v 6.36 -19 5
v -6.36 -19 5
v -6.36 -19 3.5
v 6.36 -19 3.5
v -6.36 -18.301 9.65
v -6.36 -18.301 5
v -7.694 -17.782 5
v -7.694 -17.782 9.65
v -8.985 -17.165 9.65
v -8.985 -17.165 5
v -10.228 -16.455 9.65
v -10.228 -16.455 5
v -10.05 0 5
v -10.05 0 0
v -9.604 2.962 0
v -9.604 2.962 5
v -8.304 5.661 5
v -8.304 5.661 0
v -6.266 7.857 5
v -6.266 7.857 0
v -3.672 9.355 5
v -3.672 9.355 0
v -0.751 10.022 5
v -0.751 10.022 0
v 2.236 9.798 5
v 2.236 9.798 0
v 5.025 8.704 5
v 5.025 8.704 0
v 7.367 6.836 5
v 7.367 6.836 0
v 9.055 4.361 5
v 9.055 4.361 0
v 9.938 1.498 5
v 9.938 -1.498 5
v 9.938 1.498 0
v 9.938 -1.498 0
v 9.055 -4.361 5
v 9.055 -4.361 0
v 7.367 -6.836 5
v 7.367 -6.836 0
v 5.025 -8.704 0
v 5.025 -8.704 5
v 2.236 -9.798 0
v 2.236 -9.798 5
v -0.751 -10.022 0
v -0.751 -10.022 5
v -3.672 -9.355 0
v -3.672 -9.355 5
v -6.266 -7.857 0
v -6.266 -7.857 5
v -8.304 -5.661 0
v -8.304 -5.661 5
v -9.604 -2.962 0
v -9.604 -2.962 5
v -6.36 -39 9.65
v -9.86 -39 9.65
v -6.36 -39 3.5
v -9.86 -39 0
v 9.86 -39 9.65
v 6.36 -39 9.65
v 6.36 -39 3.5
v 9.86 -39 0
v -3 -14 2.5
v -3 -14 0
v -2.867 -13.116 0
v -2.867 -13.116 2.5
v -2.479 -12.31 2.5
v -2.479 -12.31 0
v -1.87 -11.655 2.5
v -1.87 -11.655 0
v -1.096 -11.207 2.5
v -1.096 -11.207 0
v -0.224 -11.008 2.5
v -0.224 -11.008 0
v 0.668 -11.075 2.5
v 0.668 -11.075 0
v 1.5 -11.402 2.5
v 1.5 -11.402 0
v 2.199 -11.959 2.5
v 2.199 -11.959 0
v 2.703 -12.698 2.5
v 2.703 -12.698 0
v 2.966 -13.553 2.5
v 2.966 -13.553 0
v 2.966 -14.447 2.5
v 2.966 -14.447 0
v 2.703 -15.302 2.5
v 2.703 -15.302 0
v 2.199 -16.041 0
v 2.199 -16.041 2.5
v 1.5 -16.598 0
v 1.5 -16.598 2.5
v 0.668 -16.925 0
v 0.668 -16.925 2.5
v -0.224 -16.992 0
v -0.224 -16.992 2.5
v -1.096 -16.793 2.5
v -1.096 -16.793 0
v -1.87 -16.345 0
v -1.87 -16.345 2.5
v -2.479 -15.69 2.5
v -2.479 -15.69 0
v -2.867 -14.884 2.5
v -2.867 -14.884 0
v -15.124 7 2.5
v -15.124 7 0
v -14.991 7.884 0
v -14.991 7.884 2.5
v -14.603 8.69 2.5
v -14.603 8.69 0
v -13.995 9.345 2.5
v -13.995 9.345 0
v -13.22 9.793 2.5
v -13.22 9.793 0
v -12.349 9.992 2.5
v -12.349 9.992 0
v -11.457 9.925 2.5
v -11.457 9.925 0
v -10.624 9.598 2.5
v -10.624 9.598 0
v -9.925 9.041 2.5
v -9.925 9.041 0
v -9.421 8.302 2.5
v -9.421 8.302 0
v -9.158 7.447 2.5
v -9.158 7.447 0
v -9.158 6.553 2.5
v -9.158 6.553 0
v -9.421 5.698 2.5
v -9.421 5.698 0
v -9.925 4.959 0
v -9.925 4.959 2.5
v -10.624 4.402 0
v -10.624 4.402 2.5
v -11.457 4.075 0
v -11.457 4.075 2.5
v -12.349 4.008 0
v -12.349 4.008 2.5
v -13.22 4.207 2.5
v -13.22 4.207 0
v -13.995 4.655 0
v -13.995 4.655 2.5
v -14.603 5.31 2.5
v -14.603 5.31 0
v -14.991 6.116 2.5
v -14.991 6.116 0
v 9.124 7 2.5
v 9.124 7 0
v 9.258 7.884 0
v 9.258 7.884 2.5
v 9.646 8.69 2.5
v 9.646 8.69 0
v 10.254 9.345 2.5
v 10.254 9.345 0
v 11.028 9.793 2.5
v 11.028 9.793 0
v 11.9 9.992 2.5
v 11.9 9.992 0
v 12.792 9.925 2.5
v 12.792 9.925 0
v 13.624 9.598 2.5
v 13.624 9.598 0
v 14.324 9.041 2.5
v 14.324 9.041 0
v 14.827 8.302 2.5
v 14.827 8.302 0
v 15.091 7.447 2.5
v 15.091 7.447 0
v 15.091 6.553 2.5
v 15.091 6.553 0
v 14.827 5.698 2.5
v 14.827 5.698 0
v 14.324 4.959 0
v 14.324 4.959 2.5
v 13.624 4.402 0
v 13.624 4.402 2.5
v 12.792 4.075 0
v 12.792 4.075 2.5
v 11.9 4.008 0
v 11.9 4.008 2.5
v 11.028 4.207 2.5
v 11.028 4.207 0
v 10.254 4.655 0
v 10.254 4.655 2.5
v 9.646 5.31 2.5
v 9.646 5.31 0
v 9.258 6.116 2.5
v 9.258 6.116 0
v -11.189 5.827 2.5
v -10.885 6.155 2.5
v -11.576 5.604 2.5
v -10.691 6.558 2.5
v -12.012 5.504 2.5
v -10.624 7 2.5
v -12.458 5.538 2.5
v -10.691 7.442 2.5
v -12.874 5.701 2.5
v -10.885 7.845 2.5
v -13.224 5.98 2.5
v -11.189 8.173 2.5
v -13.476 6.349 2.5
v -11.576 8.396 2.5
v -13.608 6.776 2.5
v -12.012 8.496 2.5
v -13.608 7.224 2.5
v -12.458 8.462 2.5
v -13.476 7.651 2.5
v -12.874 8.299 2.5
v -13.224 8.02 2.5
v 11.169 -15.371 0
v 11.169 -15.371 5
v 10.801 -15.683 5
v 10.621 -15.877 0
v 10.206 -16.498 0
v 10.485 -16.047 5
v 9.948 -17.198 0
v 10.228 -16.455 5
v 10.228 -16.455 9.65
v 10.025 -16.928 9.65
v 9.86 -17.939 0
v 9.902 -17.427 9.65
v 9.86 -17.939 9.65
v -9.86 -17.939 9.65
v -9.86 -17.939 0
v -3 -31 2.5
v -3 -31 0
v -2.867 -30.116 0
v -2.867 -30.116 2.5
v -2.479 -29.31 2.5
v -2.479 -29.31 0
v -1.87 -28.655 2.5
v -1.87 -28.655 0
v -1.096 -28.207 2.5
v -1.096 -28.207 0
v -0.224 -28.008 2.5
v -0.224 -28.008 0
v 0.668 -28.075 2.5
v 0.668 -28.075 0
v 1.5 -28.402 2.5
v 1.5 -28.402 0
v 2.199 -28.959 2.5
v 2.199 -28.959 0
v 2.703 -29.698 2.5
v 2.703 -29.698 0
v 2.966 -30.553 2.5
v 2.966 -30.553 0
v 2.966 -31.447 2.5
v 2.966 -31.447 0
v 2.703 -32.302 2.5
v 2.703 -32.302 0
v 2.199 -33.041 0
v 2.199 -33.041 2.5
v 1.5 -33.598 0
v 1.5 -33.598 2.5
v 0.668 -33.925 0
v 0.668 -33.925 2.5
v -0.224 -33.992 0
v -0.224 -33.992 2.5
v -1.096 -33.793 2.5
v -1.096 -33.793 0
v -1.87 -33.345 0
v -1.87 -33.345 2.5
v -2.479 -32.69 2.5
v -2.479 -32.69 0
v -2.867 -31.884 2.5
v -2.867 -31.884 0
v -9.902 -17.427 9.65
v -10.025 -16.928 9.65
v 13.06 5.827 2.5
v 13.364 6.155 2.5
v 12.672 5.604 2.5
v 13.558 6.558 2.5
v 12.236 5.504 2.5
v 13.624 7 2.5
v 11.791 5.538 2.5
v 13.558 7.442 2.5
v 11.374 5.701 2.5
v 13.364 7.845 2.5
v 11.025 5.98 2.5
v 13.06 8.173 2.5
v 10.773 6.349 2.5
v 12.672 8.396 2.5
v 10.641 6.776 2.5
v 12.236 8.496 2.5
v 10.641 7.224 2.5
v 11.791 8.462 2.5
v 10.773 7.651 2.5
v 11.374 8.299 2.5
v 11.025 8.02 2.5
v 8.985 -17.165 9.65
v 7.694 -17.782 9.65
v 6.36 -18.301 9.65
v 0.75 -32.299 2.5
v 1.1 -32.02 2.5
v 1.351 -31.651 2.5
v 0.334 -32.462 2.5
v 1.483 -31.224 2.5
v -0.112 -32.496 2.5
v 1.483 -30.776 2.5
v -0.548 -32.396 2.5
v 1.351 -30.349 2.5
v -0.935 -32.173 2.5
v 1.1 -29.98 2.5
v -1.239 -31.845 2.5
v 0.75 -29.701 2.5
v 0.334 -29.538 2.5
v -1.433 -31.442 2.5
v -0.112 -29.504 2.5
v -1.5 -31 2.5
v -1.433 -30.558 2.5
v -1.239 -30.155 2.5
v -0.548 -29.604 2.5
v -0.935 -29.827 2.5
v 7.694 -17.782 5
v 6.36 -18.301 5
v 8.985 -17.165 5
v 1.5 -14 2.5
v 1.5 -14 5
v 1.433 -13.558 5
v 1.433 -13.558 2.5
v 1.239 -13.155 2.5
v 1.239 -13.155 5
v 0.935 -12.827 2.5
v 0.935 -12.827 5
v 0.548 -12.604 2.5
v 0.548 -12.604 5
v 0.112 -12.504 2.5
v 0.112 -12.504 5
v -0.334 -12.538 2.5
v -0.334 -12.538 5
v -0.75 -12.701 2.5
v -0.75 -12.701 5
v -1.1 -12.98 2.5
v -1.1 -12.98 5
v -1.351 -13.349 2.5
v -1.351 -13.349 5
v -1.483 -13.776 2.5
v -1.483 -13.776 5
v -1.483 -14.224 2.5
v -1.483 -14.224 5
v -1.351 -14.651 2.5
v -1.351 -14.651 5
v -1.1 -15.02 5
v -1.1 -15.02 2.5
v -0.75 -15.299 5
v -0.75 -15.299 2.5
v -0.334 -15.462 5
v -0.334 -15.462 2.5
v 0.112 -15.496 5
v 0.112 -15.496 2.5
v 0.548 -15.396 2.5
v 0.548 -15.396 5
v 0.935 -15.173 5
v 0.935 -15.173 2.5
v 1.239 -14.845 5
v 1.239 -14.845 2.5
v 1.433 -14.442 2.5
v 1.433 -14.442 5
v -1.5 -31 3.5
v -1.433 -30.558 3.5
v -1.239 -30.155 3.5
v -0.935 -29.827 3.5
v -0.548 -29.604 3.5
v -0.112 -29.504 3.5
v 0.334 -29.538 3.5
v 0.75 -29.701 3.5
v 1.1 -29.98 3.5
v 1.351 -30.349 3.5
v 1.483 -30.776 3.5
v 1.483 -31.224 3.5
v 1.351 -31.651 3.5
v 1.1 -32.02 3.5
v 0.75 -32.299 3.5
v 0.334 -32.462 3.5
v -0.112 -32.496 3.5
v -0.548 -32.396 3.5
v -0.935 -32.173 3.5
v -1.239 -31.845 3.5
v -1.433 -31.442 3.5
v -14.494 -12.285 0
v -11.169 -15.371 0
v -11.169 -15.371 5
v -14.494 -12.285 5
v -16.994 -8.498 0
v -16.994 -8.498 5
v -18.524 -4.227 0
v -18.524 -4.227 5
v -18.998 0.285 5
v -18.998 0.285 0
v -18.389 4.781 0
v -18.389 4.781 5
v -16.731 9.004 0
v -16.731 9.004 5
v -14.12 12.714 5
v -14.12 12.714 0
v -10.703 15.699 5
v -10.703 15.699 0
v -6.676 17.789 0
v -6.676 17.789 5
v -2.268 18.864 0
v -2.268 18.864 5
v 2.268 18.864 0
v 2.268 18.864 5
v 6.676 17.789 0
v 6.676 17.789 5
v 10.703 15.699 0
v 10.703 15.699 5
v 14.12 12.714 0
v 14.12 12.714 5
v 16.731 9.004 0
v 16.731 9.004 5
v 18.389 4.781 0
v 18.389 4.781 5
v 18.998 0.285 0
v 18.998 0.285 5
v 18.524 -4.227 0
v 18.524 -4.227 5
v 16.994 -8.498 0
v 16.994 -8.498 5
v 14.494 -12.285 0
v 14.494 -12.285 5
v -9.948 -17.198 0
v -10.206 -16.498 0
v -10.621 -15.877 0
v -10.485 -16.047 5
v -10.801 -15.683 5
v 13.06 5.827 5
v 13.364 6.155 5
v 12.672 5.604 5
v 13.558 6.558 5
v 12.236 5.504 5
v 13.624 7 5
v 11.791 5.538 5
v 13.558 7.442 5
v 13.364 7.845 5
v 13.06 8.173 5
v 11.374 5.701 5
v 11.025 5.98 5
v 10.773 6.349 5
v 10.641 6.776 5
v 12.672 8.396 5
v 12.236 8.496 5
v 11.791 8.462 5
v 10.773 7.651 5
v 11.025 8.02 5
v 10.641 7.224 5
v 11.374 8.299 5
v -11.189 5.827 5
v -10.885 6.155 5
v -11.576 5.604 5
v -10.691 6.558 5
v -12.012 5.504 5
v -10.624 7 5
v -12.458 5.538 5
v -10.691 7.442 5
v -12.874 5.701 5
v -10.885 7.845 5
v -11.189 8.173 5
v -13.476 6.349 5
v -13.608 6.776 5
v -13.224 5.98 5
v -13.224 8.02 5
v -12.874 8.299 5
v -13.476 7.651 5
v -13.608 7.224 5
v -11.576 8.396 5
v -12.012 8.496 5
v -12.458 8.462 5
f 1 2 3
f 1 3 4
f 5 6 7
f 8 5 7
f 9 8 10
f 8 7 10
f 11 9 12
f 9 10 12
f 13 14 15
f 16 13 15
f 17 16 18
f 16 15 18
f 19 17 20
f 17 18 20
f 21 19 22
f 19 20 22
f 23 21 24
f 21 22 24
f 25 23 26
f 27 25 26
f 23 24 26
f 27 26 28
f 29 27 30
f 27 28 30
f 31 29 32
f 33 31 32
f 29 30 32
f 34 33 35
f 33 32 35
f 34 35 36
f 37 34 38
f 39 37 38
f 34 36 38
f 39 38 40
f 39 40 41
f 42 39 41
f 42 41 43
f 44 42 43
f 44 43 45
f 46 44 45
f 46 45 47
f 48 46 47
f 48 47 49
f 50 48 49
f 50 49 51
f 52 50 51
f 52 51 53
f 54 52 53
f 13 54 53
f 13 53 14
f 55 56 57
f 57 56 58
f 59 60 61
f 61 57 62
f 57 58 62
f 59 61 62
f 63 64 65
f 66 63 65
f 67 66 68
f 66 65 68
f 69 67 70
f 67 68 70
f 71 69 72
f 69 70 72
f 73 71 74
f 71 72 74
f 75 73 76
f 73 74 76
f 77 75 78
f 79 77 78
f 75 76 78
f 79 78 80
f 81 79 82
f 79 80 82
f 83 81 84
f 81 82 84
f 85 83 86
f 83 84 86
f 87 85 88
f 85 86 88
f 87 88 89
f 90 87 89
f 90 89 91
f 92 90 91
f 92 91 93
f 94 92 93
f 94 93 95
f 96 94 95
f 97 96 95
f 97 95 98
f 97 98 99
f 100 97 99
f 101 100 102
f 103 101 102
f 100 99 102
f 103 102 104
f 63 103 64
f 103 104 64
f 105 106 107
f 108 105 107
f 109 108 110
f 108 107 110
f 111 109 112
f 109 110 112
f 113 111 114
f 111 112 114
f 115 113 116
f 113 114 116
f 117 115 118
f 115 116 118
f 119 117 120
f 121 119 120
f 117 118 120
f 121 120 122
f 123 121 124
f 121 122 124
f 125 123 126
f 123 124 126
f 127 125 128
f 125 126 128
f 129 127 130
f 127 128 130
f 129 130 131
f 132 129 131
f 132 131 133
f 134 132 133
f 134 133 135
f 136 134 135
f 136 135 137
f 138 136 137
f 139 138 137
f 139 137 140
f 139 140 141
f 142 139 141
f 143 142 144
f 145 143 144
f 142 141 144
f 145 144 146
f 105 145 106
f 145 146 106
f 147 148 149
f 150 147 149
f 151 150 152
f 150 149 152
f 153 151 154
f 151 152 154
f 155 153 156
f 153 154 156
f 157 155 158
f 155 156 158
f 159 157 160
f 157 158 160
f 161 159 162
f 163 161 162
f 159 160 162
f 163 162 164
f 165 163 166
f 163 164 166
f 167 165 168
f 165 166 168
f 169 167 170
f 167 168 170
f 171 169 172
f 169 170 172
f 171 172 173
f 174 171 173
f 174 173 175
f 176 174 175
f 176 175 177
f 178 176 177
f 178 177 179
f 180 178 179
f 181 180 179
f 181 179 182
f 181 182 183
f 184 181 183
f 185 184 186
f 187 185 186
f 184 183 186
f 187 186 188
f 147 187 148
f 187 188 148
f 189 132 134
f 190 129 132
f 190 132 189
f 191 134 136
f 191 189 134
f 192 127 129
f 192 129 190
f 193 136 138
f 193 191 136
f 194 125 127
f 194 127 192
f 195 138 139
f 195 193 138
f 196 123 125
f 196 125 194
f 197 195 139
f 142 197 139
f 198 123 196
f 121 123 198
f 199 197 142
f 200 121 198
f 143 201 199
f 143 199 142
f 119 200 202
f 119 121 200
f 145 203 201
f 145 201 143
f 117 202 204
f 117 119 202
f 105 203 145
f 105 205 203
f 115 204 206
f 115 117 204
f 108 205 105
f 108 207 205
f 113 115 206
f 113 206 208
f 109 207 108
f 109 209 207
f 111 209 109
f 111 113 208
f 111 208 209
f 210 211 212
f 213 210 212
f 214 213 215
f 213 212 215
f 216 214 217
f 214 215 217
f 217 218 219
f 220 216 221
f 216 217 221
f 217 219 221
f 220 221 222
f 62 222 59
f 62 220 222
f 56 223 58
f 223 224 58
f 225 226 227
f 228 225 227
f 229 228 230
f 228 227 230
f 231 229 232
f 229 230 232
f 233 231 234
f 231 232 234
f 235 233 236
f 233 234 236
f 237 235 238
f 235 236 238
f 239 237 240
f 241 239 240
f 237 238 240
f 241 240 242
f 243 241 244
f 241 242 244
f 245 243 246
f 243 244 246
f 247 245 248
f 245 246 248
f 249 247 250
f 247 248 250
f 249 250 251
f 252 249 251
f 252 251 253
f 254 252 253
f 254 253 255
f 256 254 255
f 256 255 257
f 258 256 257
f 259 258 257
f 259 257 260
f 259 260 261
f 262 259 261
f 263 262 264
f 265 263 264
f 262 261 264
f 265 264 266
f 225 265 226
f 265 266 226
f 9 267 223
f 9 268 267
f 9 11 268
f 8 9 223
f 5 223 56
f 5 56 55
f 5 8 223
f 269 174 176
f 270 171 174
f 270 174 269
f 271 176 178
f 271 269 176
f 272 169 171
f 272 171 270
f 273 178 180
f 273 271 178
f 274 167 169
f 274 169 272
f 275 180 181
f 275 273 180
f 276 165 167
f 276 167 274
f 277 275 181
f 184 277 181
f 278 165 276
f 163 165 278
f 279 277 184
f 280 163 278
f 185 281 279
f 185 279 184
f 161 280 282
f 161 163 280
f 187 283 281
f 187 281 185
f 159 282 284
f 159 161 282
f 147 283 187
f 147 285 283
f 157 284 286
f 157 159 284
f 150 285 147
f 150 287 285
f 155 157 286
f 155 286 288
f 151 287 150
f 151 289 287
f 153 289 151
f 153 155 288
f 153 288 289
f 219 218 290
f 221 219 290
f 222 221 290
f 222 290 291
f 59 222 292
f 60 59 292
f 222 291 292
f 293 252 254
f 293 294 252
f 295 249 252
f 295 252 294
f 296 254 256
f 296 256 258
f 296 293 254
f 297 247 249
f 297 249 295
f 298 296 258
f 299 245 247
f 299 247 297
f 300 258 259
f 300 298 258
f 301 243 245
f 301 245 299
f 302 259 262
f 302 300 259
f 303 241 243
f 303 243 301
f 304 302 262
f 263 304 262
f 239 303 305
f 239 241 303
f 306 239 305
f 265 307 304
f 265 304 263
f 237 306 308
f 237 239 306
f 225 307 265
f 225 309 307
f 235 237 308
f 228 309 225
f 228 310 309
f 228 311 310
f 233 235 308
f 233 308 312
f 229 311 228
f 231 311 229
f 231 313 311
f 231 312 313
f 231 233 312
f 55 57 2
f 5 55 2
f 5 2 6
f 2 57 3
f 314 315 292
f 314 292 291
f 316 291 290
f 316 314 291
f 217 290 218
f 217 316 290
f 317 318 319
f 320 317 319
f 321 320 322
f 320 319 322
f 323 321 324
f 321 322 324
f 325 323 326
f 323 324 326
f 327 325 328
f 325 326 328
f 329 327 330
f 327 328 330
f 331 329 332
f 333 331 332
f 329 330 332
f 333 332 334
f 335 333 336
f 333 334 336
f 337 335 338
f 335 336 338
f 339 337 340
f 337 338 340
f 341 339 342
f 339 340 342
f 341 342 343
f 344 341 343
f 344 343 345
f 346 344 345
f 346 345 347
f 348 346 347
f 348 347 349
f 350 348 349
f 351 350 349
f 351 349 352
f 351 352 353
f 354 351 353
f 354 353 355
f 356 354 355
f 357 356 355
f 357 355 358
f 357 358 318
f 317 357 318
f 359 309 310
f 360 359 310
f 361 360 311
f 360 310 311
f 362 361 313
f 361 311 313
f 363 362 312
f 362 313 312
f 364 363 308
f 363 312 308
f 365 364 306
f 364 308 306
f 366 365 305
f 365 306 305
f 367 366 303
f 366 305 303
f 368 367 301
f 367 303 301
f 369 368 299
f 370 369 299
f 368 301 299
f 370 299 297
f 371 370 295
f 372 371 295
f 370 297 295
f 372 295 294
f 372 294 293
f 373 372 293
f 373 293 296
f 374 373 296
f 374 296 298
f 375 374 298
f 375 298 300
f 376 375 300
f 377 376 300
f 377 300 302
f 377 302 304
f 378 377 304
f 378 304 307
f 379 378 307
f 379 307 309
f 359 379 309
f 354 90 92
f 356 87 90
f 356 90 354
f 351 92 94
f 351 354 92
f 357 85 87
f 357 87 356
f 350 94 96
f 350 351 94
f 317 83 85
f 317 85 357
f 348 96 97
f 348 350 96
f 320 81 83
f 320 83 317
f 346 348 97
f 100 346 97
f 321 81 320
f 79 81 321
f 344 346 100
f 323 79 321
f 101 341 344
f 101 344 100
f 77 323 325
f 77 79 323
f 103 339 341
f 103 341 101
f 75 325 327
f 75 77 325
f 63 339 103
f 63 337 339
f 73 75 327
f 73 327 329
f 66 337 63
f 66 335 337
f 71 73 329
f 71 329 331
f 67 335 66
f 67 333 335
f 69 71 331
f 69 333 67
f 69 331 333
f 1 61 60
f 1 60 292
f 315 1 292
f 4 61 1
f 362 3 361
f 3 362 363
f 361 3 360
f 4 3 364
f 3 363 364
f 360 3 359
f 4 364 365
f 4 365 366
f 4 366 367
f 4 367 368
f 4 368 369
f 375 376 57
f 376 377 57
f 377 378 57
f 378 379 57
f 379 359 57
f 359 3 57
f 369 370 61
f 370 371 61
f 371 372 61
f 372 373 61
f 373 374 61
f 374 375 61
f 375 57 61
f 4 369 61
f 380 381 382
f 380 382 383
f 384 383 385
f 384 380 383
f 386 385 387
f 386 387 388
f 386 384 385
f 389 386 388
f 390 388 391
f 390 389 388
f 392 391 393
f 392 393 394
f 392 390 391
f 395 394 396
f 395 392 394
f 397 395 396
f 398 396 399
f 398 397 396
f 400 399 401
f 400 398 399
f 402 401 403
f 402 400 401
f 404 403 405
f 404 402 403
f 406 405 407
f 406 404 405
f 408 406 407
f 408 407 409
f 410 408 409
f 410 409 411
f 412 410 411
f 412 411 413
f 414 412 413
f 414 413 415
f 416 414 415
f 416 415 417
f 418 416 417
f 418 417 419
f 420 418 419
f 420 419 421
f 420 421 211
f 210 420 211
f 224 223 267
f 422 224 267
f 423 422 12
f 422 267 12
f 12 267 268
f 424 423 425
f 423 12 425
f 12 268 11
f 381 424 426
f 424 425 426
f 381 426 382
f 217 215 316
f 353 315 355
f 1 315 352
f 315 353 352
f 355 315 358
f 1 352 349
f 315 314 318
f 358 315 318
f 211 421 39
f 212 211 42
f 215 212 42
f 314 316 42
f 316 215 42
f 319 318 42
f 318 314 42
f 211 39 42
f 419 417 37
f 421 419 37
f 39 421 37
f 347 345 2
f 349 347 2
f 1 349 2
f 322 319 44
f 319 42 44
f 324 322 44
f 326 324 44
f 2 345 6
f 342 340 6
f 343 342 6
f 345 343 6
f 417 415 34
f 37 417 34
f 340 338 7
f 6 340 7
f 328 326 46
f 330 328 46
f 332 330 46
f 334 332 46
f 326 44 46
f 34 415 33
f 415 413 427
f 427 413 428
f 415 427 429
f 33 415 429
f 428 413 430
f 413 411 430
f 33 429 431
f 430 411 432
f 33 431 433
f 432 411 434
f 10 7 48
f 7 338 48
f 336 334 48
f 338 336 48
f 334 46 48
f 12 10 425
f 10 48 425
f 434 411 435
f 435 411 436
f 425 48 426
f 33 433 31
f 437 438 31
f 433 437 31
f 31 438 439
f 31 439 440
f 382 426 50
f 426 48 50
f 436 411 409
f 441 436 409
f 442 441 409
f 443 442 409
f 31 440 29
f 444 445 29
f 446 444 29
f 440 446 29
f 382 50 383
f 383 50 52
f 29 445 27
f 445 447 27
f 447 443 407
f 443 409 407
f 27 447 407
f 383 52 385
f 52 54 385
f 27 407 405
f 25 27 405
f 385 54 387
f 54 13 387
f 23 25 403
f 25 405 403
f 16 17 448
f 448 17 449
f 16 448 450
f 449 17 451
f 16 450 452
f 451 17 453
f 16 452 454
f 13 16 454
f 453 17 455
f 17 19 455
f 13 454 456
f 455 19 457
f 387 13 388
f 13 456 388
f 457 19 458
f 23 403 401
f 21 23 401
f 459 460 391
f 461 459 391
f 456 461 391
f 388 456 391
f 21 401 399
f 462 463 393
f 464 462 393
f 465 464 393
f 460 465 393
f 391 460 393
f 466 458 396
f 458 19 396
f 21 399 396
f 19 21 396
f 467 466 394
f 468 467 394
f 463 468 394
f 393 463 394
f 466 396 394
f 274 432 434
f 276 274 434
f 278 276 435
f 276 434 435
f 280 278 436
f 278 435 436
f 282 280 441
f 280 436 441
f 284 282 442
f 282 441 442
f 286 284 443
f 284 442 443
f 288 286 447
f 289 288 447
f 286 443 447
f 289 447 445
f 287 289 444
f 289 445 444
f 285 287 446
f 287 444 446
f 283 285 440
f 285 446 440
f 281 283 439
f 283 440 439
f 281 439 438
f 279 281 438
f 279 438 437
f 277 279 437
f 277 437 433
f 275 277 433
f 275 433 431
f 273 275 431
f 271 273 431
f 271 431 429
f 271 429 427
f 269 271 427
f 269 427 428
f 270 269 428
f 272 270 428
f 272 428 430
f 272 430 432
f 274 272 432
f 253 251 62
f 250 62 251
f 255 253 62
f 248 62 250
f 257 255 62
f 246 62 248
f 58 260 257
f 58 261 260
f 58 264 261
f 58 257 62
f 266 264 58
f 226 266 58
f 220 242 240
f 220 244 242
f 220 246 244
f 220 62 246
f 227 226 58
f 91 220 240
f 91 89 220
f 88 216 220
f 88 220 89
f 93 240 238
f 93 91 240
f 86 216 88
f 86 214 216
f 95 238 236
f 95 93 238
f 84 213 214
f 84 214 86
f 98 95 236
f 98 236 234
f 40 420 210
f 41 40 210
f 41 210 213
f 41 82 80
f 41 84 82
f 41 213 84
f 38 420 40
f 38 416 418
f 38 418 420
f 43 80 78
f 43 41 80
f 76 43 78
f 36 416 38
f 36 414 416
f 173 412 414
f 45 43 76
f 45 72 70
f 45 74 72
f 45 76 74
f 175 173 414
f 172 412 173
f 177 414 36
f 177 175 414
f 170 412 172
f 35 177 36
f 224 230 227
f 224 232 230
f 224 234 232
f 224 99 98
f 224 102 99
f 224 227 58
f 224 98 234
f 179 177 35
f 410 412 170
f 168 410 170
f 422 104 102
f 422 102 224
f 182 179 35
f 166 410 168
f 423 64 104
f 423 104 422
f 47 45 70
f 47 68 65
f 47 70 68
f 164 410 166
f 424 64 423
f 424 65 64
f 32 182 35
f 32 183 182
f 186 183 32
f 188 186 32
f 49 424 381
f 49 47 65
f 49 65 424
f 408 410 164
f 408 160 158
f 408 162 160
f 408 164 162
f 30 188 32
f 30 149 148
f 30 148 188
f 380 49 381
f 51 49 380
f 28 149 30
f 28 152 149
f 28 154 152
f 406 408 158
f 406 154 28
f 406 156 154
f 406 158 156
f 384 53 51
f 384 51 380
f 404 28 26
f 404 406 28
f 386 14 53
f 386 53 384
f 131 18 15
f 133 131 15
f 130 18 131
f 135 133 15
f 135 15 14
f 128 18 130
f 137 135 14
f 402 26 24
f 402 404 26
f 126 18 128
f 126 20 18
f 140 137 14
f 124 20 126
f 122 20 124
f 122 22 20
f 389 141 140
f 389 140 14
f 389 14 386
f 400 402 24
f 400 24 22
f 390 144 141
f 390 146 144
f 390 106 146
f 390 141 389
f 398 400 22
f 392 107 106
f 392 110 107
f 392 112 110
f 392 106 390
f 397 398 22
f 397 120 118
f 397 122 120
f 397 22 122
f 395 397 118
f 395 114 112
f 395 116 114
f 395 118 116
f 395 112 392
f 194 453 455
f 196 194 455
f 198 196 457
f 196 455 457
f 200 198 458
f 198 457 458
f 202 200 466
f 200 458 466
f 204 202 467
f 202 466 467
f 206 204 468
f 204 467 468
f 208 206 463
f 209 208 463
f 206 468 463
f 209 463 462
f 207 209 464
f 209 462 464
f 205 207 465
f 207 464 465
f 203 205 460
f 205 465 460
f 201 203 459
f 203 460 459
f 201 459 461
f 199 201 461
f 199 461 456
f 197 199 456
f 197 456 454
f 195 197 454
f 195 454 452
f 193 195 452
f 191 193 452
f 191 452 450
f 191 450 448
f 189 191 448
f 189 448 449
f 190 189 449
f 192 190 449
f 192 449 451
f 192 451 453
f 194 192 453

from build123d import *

# Parameters (mm, degrees)
SKETCH1_R           = 10
BOSS_EXTRUDE1_DEPTH = 5
SKETCH5_W           = 12.72
SKETCH5_H           = 1.5
CUT_EXTRUDE1_DEPTH  = 20
SKETCH18_R          = 1.5
CUT_EXTRUDE6_DEPTH  = 6
SKETCH10_W          = 3.5
SKETCH10_H          = 20
BOSS_EXTRUDE3_DEPTH = 4.65
SKETCH15_R          = 3
CUT_EXTRUDE4_DEPTH  = 2.5
SKETCH19_R          = 10.05
CUT_EXTRUDE7_DEPTH  = 10.65
BOSS_EXTRUDE6_DEPTH = 4.65
SKETCH24_R          = 1.5
CUT_EXTRUDE8_DEPTH  = 7
SKETCH25_R          = 3
CUT_EXTRUDE9_DEPTH  = 2.5
FILLET5_R           = 3.175


with BuildPart() as part:
    # Sketch1 → Boss-Extrude1 (new body)
    with BuildSketch(Plane.XY):
        with BuildLine():
            Line((9.86, -39), (-9.86, -39))
            Line((-9.86, -39), (-9.86, -16.241317681))
            ThreePointArc((-9.86, -16.241317681), (0, 19), (9.86, -16.241317681))
            Line((9.86, -16.241317681), (9.86, -39))
        make_face()
        Circle(SKETCH1_R, mode=Mode.SUBTRACT)
    extrude(amount=BOSS_EXTRUDE1_DEPTH)

    # Sketch5 → Cut-Extrude1 (cut)
    with BuildSketch(Plane.XZ.offset(39)):
        with Locations((0, 4.25)):
            Rectangle(SKETCH5_W, SKETCH5_H)
    extrude(amount=-CUT_EXTRUDE1_DEPTH, mode=Mode.SUBTRACT)

    # Sketch18 → Cut-Extrude6 (cut, through all)
    with BuildSketch(Plane.XY.offset(5)):
        with Locations((0, -14)):
            Circle(SKETCH18_R)
        with Locations((-12.124355653, 7)):
            Circle(SKETCH18_R)
        with Locations((12.124355653, 7)):
            Circle(SKETCH18_R)
    extrude(amount=-CUT_EXTRUDE6_DEPTH, mode=Mode.SUBTRACT)

    # Sketch10 → Boss-Extrude3 (add)
    with BuildSketch(Plane.XY.offset(5)):
        with Locations((-8.11, -29)):
            Rectangle(SKETCH10_W, SKETCH10_H)
        with Locations((8.11, -29)):
            Rectangle(SKETCH10_W, SKETCH10_H)
    extrude(amount=BOSS_EXTRUDE3_DEPTH)

    # Sketch15 → Cut-Extrude4 (cut)
    with BuildSketch(Plane(origin=(0, 0, 0), x_dir=(-1, 0, 0), z_dir=(0, 0, -1))):
        with Locations((0, -14)):
            Circle(SKETCH15_R)
        with Locations((-12.124355653, 7)):
            Circle(SKETCH15_R)
        with Locations((12.124355653, 7)):
            Circle(SKETCH15_R)
    extrude(amount=-CUT_EXTRUDE4_DEPTH, mode=Mode.SUBTRACT)

    # Sketch19 → Cut-Extrude7 (cut, through all)
    with BuildSketch(Plane(origin=(0, 0, 0), x_dir=(-1, 0, 0), z_dir=(0, 0, -1))):
        Circle(SKETCH19_R)
    extrude(amount=-CUT_EXTRUDE7_DEPTH, mode=Mode.SUBTRACT)

    # Sketch23 → Boss-Extrude6 (add)
    with BuildSketch(Plane.XY.offset(5)):
        with BuildLine():
            Line((9.86, -16.678459911), (9.86, -19))
            Line((9.86, -19), (6.36, -19))
            Line((6.36, -19), (6.36, -18.301394073))
            ThreePointArc((6.36, -18.301394073), (8.150495618, -17.577259348), (9.86, -16.678459911))
        make_face()
    boss_extrude6 = extrude(amount=BOSS_EXTRUDE6_DEPTH)

    # Mirror1: Boss-Extrude6 across plane
    add(boss_extrude6.mirror(Plane(origin=(0, 0, 0), x_dir=(0, 0, 1), z_dir=(1, 0, 0))))

    # Sketch24 → Cut-Extrude8 (cut)
    with BuildSketch(Plane(origin=(0, 0, 0), x_dir=(-1, 0, 0), z_dir=(0, 0, -1))):
        with Locations((0, -31)):
            Circle(SKETCH24_R)
    extrude(amount=-CUT_EXTRUDE8_DEPTH, mode=Mode.SUBTRACT)

    # Sketch25 → Cut-Extrude9 (cut)
    with BuildSketch(Plane(origin=(0, 0, 0), x_dir=(-1, 0, 0), z_dir=(0, 0, -1))):
        with Locations((0, -31)):
            Circle(SKETCH25_R)
    extrude(amount=-CUT_EXTRUDE9_DEPTH, mode=Mode.SUBTRACT)

    # Fillet5
    fillet5_edges = [part.edges().sort_by_distance(p)[0] for p in [
        (9.86, -16.241317681, 2.5),
        (-9.86, -16.241317681, 2.5),
    ]]
    fillet(fillet5_edges, radius=FILLET5_R)


solid = part.part
